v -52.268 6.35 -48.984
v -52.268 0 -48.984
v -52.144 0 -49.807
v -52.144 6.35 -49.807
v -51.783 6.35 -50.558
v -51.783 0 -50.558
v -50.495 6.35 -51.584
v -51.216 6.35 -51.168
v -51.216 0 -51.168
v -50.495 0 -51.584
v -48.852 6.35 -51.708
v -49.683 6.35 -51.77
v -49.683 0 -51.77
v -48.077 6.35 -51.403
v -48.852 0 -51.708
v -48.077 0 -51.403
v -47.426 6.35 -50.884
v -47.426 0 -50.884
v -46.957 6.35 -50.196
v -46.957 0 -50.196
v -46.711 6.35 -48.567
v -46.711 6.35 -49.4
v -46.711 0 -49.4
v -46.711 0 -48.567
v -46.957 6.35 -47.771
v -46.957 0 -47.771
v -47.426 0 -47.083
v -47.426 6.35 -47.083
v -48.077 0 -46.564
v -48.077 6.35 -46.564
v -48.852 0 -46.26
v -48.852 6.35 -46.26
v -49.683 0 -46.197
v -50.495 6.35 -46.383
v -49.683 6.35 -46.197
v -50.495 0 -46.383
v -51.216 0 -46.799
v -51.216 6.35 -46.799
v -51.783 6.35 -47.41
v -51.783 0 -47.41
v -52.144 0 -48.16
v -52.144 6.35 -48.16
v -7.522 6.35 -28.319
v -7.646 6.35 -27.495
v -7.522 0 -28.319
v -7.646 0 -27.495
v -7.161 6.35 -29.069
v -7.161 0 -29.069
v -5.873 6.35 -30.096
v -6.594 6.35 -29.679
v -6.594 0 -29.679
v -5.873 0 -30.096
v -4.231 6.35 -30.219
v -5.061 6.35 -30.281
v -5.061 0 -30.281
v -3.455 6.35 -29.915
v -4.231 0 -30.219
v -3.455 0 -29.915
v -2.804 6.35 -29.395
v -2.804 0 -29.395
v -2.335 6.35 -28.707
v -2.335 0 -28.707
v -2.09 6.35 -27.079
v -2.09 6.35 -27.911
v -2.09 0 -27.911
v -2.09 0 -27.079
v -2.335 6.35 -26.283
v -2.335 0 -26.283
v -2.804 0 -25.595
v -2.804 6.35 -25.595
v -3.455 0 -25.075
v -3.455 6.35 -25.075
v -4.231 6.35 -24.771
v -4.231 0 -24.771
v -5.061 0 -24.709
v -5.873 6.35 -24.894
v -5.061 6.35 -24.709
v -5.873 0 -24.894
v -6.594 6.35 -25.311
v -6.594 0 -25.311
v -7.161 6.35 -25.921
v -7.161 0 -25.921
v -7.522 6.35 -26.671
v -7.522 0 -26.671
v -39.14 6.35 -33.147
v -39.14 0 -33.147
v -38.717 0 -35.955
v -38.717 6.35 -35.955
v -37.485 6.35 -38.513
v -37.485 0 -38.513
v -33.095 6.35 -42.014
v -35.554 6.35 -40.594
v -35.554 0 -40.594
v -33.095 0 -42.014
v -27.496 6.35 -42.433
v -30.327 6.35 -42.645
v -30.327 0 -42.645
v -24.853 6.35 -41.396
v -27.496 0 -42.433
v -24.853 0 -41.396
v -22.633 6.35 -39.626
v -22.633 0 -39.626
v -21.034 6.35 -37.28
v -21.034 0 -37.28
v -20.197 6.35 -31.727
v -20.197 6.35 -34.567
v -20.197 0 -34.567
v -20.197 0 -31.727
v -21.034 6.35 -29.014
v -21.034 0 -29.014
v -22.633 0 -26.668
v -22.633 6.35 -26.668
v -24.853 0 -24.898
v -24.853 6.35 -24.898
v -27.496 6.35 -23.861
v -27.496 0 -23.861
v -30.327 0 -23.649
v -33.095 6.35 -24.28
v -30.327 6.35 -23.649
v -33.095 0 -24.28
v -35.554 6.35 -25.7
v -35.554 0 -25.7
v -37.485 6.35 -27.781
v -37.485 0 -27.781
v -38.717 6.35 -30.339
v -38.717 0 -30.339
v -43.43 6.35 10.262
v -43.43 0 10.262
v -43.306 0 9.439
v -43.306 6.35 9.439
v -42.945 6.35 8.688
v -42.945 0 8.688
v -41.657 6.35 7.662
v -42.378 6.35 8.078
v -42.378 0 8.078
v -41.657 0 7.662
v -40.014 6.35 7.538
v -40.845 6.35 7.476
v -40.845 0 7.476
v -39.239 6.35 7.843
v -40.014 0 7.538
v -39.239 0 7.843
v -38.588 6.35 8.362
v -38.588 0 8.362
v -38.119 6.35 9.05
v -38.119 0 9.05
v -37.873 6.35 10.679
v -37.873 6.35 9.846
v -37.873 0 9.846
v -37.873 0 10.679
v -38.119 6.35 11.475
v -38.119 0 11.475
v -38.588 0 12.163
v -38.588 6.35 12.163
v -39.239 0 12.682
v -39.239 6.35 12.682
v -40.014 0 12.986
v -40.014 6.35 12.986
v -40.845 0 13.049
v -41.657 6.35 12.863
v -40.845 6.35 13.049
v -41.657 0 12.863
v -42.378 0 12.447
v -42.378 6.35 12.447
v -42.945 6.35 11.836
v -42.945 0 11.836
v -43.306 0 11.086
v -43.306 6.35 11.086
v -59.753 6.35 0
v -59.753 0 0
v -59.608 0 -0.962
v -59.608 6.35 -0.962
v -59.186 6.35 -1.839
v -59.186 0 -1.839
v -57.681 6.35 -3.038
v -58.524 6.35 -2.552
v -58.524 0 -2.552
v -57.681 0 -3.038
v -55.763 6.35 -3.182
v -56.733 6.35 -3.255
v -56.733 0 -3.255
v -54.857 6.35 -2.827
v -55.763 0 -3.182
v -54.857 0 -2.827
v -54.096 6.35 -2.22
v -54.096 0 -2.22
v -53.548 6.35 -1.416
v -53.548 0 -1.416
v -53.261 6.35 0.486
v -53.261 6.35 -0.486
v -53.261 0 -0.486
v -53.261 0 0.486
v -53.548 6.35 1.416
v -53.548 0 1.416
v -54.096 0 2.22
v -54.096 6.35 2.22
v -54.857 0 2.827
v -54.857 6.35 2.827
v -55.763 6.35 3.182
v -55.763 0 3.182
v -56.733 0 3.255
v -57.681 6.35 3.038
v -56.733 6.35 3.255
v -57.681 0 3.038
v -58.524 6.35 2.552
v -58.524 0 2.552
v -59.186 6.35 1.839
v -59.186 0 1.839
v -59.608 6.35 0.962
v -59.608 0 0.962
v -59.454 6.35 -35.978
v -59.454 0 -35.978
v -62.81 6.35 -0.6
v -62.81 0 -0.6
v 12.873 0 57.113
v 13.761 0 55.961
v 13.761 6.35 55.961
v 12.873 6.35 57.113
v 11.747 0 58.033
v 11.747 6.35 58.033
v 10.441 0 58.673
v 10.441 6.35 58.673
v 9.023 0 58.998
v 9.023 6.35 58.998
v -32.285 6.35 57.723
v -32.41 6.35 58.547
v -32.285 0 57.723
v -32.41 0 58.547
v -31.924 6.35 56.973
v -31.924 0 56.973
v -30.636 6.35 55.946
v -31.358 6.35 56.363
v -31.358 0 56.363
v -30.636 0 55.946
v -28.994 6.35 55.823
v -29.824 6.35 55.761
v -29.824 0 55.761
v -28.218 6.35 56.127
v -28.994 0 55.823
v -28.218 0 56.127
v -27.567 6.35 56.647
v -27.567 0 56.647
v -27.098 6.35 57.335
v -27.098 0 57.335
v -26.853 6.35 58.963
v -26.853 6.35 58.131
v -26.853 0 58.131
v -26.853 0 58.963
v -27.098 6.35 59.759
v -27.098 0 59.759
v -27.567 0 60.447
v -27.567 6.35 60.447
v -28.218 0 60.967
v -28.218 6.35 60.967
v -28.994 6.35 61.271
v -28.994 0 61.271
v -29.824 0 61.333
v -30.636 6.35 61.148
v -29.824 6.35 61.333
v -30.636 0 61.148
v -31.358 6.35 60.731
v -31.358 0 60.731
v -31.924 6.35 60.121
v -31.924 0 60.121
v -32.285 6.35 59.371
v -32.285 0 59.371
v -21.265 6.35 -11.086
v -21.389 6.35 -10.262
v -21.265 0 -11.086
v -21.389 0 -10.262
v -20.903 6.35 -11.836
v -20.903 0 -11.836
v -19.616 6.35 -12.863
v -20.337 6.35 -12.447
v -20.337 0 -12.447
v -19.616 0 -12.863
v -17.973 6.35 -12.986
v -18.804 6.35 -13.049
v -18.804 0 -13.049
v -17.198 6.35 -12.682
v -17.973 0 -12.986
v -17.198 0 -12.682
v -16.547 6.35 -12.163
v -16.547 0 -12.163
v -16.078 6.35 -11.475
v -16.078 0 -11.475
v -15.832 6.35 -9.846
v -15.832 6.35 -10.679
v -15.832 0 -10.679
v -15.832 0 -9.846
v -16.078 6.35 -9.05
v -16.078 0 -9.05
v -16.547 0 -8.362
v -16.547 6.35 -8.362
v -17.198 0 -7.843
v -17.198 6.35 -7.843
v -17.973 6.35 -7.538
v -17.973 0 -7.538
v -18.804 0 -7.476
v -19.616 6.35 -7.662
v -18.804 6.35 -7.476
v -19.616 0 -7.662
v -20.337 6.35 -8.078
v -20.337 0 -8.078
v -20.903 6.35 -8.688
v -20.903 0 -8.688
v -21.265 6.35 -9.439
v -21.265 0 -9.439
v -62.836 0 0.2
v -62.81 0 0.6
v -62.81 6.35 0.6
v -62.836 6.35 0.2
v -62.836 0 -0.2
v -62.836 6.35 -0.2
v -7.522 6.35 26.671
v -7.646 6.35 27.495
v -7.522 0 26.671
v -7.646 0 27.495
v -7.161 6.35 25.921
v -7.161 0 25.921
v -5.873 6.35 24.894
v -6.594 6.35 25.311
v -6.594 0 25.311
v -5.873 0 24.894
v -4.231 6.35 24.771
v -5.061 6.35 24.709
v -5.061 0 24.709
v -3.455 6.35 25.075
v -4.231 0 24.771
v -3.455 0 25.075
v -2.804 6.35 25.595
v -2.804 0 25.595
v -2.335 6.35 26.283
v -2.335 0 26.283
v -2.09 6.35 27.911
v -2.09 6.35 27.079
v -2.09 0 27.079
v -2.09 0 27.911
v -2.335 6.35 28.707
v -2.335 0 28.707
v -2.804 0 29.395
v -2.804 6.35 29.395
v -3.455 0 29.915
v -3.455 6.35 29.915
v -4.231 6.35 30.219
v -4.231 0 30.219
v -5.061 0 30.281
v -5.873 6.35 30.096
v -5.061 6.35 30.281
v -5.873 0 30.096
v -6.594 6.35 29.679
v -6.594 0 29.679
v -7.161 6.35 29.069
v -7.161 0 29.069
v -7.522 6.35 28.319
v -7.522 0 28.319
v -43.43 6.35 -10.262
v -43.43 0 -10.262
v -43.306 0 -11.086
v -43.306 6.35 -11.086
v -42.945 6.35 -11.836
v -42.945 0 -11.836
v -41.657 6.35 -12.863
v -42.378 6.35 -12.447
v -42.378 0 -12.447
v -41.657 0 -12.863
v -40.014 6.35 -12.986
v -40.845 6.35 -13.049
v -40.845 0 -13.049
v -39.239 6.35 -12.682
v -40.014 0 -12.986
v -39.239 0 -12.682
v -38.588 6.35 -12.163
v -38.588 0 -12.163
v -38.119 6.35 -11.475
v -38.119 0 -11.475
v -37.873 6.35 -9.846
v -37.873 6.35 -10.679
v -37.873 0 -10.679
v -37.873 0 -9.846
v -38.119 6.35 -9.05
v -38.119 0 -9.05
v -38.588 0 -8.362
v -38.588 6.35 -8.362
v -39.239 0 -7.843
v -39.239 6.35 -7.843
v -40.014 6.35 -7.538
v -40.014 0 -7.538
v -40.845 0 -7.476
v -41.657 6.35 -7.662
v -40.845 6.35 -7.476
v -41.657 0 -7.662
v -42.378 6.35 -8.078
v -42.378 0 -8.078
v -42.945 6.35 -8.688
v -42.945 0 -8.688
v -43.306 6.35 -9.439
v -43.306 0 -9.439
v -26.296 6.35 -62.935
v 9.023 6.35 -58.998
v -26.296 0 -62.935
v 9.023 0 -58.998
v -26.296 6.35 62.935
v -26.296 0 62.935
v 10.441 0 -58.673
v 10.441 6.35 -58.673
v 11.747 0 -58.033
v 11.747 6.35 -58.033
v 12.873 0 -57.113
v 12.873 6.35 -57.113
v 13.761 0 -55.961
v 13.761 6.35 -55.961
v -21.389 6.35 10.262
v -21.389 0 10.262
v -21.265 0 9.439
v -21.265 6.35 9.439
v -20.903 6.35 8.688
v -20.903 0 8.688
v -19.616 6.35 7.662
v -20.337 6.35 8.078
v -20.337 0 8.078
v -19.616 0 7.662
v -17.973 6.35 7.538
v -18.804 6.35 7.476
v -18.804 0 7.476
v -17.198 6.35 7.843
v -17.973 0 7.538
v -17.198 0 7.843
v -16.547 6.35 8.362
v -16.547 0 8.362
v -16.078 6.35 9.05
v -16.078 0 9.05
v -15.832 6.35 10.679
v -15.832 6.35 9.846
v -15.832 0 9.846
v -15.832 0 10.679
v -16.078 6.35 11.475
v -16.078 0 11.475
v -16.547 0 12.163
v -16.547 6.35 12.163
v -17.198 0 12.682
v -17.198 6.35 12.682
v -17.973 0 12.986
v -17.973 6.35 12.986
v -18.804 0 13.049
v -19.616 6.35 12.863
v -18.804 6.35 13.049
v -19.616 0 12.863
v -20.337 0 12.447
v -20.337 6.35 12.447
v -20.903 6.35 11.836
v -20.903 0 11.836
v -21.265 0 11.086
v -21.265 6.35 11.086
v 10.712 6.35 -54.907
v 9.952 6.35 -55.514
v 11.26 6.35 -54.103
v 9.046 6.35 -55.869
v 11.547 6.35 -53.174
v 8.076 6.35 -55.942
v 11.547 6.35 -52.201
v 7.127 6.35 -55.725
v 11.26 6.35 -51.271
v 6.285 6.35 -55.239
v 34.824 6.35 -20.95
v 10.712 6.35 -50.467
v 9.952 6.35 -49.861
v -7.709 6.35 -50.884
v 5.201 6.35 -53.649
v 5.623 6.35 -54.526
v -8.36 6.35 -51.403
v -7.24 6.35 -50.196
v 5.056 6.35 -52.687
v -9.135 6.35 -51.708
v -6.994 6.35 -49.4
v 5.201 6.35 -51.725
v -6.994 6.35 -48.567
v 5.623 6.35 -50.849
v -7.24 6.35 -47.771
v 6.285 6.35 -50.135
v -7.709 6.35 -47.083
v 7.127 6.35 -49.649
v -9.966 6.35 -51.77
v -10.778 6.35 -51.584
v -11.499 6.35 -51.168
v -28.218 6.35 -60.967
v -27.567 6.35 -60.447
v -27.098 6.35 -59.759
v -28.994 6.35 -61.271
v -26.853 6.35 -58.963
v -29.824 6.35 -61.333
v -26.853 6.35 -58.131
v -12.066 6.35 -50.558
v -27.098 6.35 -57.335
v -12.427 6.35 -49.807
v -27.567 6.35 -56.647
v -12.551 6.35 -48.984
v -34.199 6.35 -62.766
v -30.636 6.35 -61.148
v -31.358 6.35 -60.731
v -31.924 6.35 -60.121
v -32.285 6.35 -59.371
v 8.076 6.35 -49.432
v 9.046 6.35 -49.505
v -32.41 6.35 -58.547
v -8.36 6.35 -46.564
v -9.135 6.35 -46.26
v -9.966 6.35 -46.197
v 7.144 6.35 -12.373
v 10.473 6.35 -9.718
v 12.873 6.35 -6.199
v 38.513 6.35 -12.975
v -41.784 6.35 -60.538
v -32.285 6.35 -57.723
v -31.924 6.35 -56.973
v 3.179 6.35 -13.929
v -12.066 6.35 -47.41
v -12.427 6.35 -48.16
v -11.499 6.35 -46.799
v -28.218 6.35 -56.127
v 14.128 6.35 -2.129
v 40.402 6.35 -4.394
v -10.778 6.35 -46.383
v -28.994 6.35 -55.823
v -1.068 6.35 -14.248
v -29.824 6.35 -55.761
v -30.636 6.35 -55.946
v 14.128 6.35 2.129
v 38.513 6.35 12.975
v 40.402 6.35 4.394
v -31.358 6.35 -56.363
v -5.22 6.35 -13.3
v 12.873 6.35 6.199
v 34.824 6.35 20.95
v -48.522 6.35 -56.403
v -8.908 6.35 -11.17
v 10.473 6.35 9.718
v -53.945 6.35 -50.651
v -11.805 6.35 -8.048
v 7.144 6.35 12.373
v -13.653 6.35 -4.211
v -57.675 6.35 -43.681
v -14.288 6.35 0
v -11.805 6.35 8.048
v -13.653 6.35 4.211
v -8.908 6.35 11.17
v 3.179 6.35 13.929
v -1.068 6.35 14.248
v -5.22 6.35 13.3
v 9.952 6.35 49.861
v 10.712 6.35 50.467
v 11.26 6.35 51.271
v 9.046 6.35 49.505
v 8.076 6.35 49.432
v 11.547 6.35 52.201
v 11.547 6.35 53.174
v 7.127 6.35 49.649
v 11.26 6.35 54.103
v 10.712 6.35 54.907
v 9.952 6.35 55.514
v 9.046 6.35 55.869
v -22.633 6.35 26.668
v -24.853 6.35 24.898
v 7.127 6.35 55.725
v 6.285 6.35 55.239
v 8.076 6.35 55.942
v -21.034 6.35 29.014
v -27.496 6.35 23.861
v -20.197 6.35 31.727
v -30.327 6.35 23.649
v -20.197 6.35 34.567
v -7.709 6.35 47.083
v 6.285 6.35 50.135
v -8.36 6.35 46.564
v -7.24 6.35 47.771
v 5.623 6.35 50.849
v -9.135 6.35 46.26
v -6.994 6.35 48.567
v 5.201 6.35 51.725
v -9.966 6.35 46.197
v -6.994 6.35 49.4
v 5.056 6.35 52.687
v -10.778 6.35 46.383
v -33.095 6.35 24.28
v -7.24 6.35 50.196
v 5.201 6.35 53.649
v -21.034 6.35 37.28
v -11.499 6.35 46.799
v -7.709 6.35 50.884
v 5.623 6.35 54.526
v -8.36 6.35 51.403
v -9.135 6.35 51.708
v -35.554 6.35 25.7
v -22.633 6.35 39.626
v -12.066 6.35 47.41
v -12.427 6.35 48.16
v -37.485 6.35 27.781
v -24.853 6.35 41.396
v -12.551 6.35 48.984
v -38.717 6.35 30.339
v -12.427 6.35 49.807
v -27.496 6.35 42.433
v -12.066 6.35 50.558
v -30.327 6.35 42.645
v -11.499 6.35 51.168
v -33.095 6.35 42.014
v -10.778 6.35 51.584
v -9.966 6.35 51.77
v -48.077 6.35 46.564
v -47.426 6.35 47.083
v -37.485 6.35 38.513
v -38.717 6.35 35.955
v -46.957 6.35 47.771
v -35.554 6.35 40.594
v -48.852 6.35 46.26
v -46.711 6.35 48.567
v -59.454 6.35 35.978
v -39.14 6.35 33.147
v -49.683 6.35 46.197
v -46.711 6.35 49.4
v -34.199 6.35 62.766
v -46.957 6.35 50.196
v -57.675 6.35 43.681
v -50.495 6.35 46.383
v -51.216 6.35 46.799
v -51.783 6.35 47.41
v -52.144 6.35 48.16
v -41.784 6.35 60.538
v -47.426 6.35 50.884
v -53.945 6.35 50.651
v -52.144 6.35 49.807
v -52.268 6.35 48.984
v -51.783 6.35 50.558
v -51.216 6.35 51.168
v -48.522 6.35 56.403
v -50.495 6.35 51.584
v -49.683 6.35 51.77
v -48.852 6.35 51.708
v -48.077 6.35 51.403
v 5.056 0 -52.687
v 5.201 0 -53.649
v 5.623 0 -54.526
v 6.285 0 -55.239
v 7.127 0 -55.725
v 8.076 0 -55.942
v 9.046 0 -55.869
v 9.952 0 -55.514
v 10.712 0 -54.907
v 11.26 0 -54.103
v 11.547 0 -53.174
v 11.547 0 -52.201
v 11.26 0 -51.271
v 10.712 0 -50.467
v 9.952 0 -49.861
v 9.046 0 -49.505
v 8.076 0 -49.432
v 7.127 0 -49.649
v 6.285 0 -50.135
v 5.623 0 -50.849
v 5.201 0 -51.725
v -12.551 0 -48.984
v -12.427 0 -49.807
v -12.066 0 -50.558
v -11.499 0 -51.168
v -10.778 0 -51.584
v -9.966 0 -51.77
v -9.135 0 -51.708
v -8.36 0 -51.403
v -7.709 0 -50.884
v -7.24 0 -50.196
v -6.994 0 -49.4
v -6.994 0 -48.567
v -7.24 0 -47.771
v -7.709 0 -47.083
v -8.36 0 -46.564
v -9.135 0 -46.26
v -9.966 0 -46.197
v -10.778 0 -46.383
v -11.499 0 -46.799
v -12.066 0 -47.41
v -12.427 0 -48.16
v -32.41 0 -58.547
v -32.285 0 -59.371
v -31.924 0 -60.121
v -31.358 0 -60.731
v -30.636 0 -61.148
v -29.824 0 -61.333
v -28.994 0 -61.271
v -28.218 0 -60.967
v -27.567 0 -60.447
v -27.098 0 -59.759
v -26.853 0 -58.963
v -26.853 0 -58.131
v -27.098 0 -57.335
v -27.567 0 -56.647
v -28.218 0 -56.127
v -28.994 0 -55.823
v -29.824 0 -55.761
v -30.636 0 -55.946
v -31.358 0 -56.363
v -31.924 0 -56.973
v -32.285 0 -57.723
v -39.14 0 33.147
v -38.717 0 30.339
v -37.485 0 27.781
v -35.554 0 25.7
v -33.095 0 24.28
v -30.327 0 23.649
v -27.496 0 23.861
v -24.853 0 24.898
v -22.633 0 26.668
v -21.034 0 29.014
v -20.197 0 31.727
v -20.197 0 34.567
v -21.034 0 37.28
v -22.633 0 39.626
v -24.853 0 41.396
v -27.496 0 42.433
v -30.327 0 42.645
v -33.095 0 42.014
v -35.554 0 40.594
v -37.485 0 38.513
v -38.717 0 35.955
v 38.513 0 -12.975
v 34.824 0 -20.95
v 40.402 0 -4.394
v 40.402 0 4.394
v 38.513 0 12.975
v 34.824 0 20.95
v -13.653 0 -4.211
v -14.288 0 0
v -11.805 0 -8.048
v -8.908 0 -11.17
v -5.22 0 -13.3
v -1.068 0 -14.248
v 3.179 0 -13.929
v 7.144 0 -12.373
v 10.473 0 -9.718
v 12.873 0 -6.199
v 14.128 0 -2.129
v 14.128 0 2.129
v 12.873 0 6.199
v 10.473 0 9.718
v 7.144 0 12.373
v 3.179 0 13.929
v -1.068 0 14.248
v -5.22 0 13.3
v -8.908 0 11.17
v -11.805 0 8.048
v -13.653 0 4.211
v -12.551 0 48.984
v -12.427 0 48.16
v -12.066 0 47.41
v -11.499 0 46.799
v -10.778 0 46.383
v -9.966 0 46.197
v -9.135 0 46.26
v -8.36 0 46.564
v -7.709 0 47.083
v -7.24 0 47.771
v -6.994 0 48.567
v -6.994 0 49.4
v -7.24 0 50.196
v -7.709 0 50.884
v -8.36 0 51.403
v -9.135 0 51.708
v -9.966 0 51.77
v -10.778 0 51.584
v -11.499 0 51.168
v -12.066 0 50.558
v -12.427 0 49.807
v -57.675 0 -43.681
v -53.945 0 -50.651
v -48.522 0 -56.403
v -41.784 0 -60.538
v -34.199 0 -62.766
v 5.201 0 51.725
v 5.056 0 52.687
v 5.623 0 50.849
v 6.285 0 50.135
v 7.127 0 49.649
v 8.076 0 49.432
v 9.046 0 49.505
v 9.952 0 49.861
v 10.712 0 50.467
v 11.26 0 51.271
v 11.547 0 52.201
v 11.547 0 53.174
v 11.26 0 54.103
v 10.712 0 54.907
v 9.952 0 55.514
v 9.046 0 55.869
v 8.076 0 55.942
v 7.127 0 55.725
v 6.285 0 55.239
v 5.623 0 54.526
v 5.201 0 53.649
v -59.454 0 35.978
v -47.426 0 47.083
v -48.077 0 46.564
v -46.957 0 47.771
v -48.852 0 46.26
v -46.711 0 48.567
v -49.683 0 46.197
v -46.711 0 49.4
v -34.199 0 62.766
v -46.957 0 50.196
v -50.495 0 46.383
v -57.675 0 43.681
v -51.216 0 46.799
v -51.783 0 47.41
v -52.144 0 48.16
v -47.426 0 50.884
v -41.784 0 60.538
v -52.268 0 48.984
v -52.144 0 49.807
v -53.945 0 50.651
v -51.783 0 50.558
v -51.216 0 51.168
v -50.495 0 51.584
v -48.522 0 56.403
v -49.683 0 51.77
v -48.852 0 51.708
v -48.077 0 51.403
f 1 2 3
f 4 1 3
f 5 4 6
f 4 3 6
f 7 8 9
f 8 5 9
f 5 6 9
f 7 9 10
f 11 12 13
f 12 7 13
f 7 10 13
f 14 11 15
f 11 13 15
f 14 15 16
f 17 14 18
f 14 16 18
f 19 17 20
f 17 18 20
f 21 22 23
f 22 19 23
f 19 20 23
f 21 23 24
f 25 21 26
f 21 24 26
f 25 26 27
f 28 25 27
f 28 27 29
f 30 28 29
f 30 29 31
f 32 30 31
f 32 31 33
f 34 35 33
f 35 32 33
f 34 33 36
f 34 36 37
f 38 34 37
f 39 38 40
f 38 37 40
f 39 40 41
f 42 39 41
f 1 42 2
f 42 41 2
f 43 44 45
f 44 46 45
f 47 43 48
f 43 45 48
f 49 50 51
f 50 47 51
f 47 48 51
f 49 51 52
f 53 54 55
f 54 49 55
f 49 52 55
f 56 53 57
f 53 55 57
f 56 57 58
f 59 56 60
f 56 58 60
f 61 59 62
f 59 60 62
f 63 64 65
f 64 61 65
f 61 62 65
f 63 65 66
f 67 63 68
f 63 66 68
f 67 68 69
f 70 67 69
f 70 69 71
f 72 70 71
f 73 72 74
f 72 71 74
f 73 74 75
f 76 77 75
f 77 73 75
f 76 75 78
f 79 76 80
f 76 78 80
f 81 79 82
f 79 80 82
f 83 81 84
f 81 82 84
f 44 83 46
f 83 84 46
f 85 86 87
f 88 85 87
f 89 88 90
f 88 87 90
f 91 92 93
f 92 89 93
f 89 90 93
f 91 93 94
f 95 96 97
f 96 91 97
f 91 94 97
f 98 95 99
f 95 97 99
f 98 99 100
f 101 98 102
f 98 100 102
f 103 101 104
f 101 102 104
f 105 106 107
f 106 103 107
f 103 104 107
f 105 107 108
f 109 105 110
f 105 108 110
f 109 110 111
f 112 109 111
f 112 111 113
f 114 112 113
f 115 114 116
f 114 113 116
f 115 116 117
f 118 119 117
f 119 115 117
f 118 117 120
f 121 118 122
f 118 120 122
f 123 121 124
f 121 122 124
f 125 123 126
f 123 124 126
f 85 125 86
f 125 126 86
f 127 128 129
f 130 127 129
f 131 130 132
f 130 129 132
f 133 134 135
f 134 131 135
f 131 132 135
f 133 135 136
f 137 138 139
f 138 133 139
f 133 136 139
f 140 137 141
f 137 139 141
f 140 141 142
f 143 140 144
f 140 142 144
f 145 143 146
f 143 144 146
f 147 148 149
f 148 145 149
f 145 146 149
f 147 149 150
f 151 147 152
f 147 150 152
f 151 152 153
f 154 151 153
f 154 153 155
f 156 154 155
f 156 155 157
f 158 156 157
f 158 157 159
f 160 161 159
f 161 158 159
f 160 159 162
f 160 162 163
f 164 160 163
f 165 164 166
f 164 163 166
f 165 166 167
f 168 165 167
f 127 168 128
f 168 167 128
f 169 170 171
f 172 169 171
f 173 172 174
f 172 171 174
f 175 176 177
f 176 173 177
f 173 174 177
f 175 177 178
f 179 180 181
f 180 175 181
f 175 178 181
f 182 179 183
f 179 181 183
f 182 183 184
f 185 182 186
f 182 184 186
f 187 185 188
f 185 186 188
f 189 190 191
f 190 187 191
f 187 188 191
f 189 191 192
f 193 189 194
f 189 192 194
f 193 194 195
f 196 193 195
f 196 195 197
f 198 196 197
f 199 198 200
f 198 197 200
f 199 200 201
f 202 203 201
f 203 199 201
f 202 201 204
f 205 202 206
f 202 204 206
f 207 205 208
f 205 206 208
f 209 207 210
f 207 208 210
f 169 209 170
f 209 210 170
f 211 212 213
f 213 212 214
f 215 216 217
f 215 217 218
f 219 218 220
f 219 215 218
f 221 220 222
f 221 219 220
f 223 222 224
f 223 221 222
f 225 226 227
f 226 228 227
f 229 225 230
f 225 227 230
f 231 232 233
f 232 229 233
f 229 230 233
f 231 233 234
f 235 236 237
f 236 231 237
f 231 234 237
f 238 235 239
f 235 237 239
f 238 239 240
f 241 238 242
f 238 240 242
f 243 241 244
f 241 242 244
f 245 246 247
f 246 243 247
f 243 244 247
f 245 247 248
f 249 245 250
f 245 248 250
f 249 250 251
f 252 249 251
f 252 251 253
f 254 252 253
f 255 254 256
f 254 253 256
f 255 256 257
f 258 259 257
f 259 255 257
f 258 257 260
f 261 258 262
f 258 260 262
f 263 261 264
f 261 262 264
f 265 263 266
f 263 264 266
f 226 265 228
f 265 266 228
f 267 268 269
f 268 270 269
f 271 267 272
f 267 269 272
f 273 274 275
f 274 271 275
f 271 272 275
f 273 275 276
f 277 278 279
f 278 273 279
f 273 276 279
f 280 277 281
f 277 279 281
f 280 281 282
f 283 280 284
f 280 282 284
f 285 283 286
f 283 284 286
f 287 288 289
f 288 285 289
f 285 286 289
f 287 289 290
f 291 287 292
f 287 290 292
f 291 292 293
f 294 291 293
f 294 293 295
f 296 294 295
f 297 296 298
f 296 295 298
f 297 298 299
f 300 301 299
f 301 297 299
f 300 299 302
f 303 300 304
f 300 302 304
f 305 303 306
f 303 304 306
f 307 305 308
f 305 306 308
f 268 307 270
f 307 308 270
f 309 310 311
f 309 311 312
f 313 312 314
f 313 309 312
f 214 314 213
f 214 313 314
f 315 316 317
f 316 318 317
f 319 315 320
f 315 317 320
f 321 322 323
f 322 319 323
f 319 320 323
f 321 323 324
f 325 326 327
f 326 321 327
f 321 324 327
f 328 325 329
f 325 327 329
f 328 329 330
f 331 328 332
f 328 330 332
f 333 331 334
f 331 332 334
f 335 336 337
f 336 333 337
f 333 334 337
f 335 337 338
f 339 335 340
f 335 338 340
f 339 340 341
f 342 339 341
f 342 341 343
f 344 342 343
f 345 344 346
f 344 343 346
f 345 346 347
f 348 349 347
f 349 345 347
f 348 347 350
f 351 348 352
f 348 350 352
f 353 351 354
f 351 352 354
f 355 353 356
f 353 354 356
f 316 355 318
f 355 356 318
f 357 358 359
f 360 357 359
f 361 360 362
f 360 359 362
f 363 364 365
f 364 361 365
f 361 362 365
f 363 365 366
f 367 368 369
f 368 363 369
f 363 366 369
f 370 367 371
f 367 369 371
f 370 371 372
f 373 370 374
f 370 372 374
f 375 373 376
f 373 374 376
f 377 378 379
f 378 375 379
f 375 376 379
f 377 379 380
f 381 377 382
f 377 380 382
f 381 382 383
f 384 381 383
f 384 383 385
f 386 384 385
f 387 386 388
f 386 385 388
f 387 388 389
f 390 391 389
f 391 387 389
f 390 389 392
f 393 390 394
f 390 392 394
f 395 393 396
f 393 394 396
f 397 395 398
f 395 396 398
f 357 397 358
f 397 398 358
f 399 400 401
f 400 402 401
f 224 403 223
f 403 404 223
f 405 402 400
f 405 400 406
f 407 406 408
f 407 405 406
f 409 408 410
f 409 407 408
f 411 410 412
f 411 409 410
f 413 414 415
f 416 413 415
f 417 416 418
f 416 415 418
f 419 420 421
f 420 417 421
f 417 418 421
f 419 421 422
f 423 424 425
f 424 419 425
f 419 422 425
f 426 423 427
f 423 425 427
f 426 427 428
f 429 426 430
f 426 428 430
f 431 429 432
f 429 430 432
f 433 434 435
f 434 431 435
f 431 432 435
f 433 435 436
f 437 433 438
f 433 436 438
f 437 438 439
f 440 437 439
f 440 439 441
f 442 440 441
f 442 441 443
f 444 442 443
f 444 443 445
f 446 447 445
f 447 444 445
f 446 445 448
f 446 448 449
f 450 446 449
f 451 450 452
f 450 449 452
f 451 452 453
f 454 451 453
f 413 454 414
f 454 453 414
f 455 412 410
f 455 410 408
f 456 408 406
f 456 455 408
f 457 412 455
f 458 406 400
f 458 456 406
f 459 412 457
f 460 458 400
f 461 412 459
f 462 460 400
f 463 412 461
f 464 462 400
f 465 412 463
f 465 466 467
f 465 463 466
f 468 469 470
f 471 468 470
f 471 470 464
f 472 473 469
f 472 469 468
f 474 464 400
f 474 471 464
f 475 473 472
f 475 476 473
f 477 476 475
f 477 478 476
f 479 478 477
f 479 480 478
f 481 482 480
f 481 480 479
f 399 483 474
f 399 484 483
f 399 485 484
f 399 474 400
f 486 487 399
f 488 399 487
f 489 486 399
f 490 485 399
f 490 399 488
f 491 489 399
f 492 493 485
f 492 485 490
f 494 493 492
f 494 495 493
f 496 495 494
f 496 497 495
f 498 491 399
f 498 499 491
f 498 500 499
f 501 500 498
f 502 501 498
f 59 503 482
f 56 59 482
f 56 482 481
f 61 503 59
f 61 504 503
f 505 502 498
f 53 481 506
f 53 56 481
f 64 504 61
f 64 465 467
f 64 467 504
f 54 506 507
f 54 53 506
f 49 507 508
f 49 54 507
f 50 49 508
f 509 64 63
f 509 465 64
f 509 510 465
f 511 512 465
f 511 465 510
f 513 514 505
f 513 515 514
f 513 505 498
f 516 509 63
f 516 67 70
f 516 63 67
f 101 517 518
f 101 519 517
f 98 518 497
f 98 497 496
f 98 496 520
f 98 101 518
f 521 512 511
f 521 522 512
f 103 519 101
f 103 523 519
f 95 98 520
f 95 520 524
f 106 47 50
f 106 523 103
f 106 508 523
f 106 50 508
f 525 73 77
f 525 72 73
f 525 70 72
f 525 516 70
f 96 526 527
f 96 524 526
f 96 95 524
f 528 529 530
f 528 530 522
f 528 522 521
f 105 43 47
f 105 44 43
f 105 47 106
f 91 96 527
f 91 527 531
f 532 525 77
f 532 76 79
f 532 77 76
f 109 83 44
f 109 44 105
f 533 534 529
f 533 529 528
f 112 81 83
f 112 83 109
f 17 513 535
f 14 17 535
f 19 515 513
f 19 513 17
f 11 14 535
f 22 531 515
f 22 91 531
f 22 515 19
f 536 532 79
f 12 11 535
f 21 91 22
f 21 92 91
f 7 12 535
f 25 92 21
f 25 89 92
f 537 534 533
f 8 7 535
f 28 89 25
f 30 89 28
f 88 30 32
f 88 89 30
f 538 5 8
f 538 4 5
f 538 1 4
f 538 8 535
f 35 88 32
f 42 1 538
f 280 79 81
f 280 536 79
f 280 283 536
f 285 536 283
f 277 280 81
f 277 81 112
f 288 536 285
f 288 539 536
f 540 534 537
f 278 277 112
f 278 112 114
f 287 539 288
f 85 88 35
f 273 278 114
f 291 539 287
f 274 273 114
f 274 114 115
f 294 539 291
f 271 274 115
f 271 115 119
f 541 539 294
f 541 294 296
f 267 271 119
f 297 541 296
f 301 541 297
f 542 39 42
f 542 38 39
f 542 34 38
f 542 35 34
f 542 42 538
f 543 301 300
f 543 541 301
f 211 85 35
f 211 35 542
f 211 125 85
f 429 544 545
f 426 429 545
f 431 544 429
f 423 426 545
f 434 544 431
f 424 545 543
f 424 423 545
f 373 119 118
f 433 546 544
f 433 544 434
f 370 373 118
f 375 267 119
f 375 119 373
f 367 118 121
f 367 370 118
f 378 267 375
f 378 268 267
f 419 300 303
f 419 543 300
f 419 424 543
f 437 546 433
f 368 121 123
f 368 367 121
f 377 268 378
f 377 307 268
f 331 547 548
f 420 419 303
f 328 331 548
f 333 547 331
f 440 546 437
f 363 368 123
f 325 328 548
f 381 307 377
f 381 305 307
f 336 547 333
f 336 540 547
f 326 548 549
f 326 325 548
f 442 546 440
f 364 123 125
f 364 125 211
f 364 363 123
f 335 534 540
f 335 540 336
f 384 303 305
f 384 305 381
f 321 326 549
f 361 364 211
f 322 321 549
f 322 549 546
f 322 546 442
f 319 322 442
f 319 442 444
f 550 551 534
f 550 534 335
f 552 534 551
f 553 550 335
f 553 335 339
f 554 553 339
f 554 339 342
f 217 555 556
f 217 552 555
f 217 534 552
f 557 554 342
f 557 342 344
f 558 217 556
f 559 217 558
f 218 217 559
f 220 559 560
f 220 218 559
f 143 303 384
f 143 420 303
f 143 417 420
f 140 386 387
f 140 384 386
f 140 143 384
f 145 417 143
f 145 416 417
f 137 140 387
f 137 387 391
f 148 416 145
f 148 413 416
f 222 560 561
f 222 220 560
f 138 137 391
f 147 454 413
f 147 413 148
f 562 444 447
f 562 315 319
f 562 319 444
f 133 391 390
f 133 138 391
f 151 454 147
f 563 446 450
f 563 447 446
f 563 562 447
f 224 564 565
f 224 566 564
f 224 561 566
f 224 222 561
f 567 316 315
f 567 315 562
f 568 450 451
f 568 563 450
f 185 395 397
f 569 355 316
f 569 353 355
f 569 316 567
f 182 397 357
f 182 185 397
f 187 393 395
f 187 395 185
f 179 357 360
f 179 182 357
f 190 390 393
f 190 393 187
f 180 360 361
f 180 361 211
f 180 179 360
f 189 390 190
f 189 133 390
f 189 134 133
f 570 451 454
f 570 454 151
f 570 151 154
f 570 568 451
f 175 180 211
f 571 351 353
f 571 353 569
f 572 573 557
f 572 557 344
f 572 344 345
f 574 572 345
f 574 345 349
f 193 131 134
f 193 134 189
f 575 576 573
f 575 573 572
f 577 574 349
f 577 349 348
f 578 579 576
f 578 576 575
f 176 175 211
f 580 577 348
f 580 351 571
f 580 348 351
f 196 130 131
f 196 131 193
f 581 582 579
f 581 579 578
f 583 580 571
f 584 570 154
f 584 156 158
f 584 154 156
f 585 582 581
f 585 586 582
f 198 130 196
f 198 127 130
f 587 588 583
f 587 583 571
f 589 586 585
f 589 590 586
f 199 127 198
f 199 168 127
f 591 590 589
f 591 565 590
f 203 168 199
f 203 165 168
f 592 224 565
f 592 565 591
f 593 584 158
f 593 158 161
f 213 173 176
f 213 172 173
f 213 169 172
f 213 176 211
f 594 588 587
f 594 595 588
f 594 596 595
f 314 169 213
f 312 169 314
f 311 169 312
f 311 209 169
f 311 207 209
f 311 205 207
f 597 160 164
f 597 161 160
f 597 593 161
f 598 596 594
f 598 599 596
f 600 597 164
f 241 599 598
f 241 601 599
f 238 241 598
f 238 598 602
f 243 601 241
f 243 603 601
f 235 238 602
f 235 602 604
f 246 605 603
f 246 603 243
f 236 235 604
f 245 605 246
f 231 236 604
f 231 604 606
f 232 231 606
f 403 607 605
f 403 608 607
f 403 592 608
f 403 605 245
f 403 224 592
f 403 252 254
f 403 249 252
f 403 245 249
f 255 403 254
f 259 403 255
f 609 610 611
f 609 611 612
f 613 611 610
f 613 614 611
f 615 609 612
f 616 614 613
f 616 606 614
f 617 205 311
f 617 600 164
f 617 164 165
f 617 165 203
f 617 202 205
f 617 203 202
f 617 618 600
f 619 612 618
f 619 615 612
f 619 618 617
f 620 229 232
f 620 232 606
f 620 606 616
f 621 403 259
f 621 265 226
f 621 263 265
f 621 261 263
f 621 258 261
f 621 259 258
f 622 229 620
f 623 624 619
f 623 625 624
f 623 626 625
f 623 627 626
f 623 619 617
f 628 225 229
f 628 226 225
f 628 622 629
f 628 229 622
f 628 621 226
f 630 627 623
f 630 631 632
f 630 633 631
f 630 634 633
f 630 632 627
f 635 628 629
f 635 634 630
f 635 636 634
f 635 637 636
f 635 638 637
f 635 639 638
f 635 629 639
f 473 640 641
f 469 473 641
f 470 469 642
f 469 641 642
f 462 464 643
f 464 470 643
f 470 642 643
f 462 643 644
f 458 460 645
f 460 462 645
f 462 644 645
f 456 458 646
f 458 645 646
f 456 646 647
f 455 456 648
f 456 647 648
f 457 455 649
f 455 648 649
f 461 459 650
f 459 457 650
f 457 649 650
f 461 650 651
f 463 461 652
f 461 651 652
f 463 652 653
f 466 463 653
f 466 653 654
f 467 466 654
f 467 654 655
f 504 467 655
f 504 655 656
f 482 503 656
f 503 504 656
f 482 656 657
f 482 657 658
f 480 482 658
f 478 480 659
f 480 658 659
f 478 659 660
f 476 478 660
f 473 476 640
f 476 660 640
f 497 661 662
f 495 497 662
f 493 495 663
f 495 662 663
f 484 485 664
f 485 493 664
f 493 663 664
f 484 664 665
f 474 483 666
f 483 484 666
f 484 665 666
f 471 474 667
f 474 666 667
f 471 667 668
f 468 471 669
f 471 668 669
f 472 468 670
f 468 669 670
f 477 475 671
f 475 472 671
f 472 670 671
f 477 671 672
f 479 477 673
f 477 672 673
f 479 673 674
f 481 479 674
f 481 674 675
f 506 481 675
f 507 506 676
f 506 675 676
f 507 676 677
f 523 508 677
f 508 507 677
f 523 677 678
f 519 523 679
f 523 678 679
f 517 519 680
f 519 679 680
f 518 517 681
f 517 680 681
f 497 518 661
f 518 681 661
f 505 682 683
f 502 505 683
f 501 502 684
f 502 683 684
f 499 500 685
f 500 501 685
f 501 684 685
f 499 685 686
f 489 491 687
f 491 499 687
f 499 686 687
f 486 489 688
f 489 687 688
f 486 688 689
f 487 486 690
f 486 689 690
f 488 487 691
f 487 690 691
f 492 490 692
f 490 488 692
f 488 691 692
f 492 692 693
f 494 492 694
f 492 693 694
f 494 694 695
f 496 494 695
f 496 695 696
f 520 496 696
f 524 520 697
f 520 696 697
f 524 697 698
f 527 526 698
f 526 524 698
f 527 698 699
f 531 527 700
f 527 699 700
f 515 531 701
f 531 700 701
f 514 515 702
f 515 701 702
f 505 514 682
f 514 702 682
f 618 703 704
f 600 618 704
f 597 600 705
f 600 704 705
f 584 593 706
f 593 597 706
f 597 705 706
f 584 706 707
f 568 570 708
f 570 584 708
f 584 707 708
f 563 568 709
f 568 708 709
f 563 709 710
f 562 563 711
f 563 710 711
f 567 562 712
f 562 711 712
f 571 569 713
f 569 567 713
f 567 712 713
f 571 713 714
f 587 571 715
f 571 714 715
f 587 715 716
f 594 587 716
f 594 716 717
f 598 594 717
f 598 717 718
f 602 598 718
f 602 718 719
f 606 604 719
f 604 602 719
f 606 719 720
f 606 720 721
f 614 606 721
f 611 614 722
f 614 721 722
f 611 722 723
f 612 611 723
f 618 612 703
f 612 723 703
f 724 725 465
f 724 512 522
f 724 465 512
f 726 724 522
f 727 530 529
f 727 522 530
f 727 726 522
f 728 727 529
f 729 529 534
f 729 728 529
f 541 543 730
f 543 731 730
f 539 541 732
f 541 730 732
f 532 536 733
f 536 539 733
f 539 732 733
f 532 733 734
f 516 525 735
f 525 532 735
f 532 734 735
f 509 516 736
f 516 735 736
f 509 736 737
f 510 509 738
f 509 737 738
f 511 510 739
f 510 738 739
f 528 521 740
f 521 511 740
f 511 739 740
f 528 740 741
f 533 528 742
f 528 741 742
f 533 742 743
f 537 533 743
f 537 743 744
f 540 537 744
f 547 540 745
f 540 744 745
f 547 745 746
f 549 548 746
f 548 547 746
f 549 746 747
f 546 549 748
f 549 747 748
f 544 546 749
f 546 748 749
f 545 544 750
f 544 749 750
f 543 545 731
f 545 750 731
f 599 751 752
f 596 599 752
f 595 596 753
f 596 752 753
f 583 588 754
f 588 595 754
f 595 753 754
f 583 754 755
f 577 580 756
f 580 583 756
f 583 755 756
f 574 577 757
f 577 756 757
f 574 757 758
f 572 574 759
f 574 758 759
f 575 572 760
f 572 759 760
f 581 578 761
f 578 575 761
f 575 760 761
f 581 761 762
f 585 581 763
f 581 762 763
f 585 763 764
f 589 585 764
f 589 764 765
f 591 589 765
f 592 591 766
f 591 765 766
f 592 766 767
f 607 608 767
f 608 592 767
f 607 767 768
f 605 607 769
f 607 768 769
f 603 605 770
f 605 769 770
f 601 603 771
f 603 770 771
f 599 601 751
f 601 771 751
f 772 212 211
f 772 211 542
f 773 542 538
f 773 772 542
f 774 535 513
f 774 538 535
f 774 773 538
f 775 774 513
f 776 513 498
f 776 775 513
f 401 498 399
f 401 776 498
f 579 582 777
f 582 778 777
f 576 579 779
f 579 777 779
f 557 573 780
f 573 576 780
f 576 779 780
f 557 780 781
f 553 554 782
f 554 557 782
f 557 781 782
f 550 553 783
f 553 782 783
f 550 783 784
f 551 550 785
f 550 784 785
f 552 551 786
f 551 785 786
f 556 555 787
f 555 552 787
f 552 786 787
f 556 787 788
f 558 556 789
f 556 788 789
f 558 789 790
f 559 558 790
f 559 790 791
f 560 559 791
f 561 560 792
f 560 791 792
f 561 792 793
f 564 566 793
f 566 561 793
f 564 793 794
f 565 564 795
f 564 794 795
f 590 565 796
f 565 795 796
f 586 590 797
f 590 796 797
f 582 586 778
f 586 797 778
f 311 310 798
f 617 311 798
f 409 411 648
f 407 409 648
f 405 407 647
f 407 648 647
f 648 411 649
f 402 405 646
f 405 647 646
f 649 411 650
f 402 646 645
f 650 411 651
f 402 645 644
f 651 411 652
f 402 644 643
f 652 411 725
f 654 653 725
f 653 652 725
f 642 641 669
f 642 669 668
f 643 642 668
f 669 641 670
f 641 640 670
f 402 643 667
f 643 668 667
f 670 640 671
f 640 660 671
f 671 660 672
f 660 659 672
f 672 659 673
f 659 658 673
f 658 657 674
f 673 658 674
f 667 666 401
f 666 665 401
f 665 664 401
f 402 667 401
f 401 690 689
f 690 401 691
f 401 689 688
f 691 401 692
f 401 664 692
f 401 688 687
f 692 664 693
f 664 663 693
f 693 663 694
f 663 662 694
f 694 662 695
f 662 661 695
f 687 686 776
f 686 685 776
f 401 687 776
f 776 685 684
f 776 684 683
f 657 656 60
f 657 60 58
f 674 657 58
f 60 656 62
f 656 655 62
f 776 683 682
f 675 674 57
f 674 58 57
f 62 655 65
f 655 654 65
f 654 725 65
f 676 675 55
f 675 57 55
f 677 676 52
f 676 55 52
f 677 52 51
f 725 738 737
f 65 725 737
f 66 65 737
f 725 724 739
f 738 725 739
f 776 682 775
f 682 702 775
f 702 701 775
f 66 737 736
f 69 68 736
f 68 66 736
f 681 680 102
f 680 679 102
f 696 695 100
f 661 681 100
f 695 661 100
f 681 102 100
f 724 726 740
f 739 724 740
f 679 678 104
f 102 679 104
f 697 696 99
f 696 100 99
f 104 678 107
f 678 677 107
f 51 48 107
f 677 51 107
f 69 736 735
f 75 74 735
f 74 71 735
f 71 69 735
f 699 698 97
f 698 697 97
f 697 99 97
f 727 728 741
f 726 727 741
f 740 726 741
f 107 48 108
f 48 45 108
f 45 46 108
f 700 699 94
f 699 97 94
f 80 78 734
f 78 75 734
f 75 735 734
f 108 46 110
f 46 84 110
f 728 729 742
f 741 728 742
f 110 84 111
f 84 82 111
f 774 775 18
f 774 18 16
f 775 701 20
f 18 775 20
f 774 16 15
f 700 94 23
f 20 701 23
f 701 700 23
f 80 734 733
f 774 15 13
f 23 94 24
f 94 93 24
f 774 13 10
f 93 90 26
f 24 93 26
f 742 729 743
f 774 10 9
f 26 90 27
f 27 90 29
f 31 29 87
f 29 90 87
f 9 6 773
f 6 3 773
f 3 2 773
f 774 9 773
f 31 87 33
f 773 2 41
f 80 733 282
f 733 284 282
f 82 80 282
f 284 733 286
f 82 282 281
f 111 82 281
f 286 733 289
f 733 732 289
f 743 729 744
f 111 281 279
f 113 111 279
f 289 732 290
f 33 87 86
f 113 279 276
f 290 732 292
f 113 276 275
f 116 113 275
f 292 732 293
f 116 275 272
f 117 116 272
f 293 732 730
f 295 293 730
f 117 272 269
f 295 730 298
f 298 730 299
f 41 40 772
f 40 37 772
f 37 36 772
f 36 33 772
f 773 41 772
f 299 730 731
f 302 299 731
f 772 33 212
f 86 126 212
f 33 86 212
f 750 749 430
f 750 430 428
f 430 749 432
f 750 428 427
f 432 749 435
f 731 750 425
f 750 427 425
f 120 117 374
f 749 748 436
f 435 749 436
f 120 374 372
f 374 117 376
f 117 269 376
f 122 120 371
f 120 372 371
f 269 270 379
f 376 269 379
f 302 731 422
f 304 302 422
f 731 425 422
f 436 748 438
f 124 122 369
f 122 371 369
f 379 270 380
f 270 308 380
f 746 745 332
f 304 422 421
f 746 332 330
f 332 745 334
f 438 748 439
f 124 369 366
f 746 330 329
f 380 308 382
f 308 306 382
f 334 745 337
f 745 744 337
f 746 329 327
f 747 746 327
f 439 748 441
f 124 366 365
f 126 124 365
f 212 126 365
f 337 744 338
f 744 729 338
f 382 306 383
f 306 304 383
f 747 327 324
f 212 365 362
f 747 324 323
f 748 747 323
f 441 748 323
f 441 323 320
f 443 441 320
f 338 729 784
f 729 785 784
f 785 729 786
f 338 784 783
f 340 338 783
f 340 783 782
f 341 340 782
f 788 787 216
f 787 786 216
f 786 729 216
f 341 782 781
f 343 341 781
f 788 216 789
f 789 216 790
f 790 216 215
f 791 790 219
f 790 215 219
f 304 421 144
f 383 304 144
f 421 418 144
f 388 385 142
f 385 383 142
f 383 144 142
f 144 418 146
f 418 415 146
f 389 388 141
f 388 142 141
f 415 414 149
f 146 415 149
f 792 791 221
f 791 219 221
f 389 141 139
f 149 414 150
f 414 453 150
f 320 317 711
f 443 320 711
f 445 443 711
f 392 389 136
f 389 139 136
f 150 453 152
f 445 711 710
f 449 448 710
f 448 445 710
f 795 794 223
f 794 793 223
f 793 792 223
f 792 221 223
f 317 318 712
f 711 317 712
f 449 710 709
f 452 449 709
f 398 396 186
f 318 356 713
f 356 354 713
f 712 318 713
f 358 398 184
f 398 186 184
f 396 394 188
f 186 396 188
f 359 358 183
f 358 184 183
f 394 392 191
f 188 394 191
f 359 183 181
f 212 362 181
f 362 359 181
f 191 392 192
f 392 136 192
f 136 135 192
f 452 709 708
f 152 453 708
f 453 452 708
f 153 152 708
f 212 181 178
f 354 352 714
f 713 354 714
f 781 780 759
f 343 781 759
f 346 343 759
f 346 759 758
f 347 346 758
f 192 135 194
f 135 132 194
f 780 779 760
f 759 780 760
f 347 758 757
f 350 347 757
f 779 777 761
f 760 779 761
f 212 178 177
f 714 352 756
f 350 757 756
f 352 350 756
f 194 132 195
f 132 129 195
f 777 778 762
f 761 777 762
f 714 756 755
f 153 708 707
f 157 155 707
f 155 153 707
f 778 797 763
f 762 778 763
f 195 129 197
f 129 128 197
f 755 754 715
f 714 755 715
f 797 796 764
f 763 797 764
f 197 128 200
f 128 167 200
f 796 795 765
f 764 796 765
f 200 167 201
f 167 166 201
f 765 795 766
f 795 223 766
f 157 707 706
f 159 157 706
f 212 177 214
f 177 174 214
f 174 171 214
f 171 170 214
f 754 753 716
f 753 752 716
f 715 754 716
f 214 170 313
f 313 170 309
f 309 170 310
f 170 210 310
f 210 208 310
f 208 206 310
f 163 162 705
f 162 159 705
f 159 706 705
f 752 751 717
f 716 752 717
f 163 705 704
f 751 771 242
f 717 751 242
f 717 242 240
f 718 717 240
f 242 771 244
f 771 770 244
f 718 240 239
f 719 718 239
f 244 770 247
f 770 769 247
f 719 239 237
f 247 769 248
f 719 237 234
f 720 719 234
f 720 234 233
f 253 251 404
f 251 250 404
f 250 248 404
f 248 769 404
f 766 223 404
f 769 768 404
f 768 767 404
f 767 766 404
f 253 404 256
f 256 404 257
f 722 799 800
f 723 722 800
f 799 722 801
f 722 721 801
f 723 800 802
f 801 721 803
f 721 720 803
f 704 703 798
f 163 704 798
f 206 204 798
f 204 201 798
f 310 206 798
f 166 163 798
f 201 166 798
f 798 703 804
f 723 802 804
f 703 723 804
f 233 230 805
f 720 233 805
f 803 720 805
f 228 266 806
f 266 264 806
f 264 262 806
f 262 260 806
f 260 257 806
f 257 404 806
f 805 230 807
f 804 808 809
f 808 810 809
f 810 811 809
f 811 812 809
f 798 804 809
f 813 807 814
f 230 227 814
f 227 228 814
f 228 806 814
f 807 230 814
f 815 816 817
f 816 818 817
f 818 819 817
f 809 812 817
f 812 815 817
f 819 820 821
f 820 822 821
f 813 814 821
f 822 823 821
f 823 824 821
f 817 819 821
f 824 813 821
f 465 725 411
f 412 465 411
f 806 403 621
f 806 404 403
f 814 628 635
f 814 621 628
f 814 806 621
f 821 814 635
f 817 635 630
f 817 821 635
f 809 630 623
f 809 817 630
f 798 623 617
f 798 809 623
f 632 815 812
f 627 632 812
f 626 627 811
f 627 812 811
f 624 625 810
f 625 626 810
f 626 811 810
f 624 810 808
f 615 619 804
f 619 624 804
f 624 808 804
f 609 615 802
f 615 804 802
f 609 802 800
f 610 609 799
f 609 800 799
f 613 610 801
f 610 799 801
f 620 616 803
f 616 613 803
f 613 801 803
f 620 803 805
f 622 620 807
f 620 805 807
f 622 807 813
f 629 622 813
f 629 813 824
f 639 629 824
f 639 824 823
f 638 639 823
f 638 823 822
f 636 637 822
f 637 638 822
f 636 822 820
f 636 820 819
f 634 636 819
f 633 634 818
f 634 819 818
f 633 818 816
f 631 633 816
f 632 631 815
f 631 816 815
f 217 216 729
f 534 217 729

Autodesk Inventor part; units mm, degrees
ref_plane "YZ Plane" through (0, 0, 0) normal (1, 0, 0) x (0, 1, 0)
ref_plane "XZ Plane" through (0, 0, 0) normal (0, 1, 0) x (-1, 0, 0)
ref_plane "XY Plane" through (0, 0, 0) normal (0, 0, 1) x (1, 0, 0)
sketch "Sketch1" plane through (0, 0, 0) normal (0, 1, 0) x (-1, 0, 0)
  circle A0 centre (29.6155, 33.147) radius 6.35 construction
  circle A1 centre (0, 0) radius 38.1 construction
  circle A2 centre (29.6155, -33.147) radius 6.35 construction
  circle A3 centre (29.6155, 33.147) radius 29.972 construction
  circle A4 centre (29.6155, -33.147) radius 29.972 construction
  line L0 (29.6155, 3.175) -> (29.6155, -3.175) construction
  circle A5 centre (0, 0) radius 40.64 construction
  circle A6 centre (-8.3197, 52.6872) radius 6.35 construction
  circle A7 centre (-8.3197, 52.6872) radius 3.2639
  line L1 (-7.3293, 46.4149) -> (-6.3388, 40.1426) construction
  line L2 (-2.6746, 49.7794) -> (2.9705, 46.8716) construction
  circle A8 centre (-8.3197, -52.6872) radius 6.35 construction
  circle A9 centre (-8.3197, -52.6872) radius 3.2639
  line L3 (-7.3293, -46.4149) -> (-6.3388, -40.1426) construction
  line L4 (2.9705, -46.8716) -> (-2.6746, -49.7794) construction
  circle A10 centre (56.4888, 0) radius 6.35 construction
  circle A11 centre (56.4888, 0) radius 3.2639
  line L5 (48.4908, 9.8652) -> (52.4898, 4.9326) construction
  line L6 (52.4898, -4.9326) -> (48.4908, -9.8652) construction
  circle A12 centre (0, 0) radius 14.2875
  circle A13 centre (29.6155, 33.147) radius 9.525
  circle A14 centre (29.6155, -33.147) radius 9.525
  circle A15 centre (29.6155, 33.147) radius 25.4 construction
  circle A16 centre (29.6155, 58.547) radius 2.794
  circle A17 centre (49.474, 48.9836) radius 2.794
  circle A18 centre (54.3787, 27.495) radius 2.794 construction
  circle A19 centre (40.6362, 10.2624) radius 2.794
  circle A20 centre (18.5949, 10.2624) radius 2.794
  circle A21 centre (4.8523, 27.495) radius 2.794
  circle A22 centre (9.757, 48.9836) radius 2.794
  circle A23 centre (29.6155, -33.147) radius 25.4 construction
  circle A24 centre (29.6155, -58.547) radius 2.794
  circle A25 centre (49.474, -48.9836) radius 2.794
  circle A26 centre (54.3787, -27.495) radius 2.794 construction
  circle A27 centre (40.6362, -10.2624) radius 2.794
  circle A28 centre (18.5949, -10.2624) radius 2.794
  circle A29 centre (4.8523, -27.495) radius 2.794
  circle A30 centre (9.757, -48.9836) radius 2.794
  line L7 (26.2955, 62.9346) -> (-9.0231, 58.9981)
  line L8 (-13.7609, 55.9607) -> (-34.8236, 20.9505)
  line L9 (-34.8236, -20.9505) -> (-13.7609, -55.9607)
  line L10 (-9.0231, -58.9981) -> (26.2955, -62.9346)
  line L11 (59.4535, -35.9782) -> (62.8105, -0.5998)
  line L12 (62.8105, 0.5998) -> (59.4535, 35.9782)
  arc A31 (-9.0231, 58.9981) -> (-13.7609, 55.9607) centre (-8.3197, 52.6872) ccw
  arc A32 (59.4535, 35.9782) -> (26.2955, 62.9346) centre (29.6155, 33.147) ccw
  arc A33 (-34.8236, 20.9505) -> (-34.8236, -20.9505) centre (0, 0) ccw
  arc A34 (-13.7609, -55.9607) -> (-9.0231, -58.9981) centre (-8.3197, -52.6872) ccw
  arc A35 (26.2955, -62.9346) -> (59.4535, -35.9782) centre (29.6155, -33.147) ccw
  arc A36 (62.8105, -0.5998) -> (62.8105, 0.5998) centre (56.4888, 0) ccw
  point P0 (29.6155, 0)
  dimension "d21" = 50.8
  dimension "d27" = 50.8
  dimension "d0" = 12.7
  dimension "d1" = 76.2
  dimension "d2" = 12.7
  dimension "d3" = 59.944
  dimension "d4" = 59.944
  dimension "d5" = 6.35
  dimension "d6" = 2.54
  dimension "d8" = 12.7
  dimension "d9" = 6.5278
  dimension "d11" = 6.35
  dimension "d12" = 12.7
  dimension "d13" = 6.5278
  dimension "d14" = 6.35
  dimension "d15" = 12.7
  dimension "d16" = 6.5278
  dimension "d17" = 6.35
  dimension "d18" = 6.35
  dimension "d19" = 28.575
  dimension "d20" = 19.05
  dimension "d22" = 5.588
  dimension "d25" = 360
  dimension "d30" = 360
extrude "Extrusion1" add sketch "Sketch1" along normal blind 6.35
properties material "Aluminum 6061"
